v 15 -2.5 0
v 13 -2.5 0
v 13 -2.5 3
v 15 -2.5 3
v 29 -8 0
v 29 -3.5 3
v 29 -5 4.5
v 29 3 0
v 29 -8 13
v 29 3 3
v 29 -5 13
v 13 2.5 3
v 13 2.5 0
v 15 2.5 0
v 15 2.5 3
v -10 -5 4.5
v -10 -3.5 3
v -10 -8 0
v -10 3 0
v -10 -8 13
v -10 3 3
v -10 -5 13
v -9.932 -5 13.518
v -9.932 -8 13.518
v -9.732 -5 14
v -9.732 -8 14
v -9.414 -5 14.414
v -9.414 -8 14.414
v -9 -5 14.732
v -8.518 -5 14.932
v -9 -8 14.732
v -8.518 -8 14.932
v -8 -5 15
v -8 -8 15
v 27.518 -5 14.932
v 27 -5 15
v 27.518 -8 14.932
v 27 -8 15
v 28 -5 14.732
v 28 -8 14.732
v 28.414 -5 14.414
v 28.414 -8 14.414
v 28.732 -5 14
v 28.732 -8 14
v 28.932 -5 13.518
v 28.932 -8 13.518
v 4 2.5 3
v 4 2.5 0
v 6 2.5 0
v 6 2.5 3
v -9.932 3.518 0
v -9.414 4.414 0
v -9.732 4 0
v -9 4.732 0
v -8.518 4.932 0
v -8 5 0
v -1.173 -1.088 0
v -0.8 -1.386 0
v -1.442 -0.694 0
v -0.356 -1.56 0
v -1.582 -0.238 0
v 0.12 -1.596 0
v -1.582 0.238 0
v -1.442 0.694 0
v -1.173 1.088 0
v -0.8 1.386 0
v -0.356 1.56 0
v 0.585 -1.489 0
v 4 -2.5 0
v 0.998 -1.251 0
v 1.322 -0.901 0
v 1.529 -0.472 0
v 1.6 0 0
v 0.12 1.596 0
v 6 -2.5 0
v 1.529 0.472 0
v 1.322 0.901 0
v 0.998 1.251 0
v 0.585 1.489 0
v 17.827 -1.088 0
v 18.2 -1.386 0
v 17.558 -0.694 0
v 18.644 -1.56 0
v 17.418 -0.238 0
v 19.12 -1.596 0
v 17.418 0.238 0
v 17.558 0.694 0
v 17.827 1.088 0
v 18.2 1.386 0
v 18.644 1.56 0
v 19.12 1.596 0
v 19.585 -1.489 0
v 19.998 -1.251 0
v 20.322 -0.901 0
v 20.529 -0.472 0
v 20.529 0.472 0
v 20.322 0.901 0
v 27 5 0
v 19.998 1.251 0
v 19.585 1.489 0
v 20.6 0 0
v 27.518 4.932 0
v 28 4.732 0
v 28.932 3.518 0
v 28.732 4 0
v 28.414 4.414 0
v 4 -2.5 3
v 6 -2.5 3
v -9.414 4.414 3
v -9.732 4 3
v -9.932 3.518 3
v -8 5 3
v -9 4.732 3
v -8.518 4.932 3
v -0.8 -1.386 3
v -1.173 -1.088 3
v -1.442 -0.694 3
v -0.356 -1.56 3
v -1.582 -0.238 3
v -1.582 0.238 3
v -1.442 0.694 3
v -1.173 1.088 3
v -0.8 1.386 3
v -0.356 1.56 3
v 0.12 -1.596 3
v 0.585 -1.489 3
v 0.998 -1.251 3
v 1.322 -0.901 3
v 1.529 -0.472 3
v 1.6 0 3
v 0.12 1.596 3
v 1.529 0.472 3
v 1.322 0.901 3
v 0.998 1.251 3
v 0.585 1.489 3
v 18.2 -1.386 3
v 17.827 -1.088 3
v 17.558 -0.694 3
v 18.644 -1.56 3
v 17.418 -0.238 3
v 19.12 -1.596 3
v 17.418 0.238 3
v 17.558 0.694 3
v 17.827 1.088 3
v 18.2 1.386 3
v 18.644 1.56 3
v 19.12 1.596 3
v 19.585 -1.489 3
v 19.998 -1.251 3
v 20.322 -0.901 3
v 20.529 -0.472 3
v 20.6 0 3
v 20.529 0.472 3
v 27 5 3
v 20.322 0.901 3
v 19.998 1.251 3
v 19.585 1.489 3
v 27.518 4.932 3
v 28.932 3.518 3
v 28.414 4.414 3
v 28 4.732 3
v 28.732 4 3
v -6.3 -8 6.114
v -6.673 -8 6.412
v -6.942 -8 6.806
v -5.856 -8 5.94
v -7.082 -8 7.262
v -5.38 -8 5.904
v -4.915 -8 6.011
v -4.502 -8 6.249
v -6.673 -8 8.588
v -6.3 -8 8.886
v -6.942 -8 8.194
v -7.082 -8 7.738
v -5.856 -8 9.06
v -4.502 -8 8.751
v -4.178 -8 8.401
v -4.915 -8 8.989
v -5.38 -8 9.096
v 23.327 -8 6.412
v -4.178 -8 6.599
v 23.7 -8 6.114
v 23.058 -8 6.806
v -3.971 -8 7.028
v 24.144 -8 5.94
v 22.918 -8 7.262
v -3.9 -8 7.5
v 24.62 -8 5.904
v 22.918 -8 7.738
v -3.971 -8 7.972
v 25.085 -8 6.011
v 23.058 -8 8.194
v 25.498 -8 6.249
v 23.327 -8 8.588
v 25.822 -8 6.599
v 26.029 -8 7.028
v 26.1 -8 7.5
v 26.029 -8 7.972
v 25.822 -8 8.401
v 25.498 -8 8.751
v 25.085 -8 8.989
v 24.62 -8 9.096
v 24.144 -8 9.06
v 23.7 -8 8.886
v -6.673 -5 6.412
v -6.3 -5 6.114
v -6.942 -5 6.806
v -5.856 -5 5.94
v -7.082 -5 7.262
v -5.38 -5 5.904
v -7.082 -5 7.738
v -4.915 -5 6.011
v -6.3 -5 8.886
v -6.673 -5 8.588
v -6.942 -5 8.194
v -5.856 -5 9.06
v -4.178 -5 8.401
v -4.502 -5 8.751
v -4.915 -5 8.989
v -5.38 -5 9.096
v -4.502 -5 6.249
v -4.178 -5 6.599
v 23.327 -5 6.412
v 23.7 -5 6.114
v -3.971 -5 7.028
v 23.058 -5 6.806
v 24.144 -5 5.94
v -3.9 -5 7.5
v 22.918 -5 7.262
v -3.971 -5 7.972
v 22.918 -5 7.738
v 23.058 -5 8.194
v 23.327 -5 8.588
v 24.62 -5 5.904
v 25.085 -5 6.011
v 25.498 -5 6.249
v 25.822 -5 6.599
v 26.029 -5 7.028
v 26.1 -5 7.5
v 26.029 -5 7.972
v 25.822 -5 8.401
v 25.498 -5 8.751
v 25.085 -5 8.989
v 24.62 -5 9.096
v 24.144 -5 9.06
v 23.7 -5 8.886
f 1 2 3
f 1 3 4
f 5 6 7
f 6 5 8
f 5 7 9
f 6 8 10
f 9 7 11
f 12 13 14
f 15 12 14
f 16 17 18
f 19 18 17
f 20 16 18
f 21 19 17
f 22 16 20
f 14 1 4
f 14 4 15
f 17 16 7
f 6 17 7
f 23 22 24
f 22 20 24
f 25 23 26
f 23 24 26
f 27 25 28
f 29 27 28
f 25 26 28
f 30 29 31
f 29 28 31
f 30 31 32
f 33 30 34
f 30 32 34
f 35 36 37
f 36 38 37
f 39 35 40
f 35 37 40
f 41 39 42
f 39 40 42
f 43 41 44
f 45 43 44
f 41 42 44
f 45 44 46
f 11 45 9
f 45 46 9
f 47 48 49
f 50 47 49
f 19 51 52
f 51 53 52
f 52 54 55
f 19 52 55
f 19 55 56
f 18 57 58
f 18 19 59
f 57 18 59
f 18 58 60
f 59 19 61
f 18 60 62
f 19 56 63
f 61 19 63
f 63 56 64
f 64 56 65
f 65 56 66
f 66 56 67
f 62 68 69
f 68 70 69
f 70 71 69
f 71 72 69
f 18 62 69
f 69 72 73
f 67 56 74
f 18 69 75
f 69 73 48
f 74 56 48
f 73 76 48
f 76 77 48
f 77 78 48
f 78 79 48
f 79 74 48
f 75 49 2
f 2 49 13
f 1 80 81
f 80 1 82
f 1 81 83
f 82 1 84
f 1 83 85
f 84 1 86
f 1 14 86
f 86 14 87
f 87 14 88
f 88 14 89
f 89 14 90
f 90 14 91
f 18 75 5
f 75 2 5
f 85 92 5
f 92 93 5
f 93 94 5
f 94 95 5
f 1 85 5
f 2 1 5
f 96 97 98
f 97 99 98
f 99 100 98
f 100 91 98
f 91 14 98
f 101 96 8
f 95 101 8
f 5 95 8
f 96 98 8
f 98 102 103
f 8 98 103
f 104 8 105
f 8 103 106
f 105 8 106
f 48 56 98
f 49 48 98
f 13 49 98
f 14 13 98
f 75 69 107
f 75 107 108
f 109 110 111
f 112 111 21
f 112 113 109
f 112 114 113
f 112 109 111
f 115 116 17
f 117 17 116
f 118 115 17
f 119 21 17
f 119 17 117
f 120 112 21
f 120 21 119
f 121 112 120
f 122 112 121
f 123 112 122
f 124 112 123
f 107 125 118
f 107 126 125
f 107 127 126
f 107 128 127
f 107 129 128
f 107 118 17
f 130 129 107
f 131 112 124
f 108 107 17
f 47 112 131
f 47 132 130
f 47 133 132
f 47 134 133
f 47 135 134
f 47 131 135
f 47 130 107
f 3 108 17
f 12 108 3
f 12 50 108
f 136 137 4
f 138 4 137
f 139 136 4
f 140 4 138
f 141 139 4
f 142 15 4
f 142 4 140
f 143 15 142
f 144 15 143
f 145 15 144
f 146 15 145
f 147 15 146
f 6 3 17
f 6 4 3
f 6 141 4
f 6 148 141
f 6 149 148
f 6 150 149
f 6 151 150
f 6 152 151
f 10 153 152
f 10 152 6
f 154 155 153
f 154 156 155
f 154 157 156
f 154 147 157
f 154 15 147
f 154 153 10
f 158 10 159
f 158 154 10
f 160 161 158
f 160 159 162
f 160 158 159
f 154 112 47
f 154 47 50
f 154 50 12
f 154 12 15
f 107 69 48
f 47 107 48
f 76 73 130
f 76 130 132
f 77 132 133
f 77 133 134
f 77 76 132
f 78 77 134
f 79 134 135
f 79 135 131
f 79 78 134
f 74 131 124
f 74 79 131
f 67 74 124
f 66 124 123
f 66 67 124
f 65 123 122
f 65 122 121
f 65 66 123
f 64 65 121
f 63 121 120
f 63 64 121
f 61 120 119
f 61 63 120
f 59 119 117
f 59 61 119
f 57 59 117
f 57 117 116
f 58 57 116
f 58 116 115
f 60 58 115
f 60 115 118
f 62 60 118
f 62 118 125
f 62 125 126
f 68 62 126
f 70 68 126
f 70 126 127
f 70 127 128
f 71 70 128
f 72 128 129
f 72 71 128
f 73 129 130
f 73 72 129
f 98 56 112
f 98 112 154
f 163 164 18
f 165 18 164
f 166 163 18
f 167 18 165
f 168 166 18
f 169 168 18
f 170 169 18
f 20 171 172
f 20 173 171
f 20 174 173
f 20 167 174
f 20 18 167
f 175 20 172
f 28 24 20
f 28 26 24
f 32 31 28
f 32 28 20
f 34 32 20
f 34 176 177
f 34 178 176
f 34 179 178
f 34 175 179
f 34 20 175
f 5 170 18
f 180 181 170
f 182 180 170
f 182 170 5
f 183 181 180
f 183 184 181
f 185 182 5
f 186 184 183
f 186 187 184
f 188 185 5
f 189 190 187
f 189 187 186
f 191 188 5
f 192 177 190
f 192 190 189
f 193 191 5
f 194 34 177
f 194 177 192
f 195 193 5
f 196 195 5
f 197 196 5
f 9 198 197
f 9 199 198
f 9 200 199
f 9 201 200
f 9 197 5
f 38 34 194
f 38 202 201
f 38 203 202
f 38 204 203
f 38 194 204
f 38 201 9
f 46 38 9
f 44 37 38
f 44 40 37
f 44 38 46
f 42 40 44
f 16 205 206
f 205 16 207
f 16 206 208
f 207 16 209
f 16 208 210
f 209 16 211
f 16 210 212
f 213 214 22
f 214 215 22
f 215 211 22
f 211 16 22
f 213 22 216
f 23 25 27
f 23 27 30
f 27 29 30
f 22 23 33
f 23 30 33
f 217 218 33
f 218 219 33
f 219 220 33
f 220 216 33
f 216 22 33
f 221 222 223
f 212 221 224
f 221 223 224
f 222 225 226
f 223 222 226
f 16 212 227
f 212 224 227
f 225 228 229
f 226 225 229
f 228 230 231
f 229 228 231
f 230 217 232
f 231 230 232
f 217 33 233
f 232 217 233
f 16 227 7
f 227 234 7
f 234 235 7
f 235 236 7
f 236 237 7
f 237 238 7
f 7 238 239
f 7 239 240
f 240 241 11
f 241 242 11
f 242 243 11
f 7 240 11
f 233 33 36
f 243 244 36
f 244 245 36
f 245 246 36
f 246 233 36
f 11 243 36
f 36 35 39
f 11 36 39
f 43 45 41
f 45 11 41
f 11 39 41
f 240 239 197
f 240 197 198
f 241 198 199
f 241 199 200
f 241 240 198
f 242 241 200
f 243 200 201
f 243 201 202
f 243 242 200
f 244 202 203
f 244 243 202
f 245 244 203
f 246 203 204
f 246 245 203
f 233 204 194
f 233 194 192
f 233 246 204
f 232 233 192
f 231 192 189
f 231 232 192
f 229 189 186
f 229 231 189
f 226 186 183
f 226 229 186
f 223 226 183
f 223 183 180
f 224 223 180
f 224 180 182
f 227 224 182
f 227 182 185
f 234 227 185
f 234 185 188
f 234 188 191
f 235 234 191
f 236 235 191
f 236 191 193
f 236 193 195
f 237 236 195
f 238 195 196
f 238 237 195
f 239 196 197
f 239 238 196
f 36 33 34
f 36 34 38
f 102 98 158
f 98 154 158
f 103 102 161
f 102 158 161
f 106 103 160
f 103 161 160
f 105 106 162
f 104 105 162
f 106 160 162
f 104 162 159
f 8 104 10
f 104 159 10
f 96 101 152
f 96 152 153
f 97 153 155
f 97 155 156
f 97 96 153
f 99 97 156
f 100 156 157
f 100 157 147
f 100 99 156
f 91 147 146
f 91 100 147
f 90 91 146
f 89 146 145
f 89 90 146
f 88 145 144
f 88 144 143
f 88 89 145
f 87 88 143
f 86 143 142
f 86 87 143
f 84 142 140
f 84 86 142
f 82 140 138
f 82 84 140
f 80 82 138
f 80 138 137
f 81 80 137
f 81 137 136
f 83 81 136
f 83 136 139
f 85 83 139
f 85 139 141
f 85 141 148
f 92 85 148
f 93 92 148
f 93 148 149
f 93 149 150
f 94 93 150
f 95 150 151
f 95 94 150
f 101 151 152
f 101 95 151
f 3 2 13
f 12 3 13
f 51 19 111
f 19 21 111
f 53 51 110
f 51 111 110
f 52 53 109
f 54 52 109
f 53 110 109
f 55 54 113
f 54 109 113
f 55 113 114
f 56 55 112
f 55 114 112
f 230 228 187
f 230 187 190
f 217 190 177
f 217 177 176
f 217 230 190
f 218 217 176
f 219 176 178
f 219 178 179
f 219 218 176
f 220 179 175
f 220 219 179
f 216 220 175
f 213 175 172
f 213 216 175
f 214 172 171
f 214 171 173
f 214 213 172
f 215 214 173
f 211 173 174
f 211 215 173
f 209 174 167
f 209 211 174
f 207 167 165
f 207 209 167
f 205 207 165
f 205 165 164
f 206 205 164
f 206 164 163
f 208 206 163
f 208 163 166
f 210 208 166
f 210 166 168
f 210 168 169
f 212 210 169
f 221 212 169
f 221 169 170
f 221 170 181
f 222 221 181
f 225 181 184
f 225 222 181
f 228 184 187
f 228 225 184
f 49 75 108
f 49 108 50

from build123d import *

# Parameters (mm, degrees)
SKETCH_1_W      = 39
SKETCH_1_H      = 10
SKETCH_1_R      = 1.6
SKETCH_1_W_2    = 2
SKETCH_1_H_2    = 5
EXTRUDE_1_DEPTH = 3
SKETCH_2_W      = 39
SKETCH_2_H      = 15
SKETCH_2_R      = 1.6
EXTRUDE_2_DEPTH = 3
CHAMFER_1_SIZE  = 1.5
FILLET_1_R      = 2


with BuildPart() as part:
    # ｽｹｯﾁ1 → ﾎﾞｽ - 押し出し1 (new body)
    with BuildSketch(Plane.XY):
        with Locations((9.5, 0)):
            Rectangle(SKETCH_1_W, SKETCH_1_H)
        Circle(SKETCH_1_R, mode=Mode.SUBTRACT)
        with Locations((19, 0)):
            Circle(SKETCH_1_R, mode=Mode.SUBTRACT)
        with Locations((5, 0)):
            Rectangle(SKETCH_1_W_2, SKETCH_1_H_2, mode=Mode.SUBTRACT)
        with Locations((14, 0)):
            Rectangle(SKETCH_1_W_2, SKETCH_1_H_2, mode=Mode.SUBTRACT)
    extrude(amount=EXTRUDE_1_DEPTH)

    # ｽｹｯﾁ2 → ﾎﾞｽ - 押し出し2 (add)
    with BuildSketch(Plane.XZ.offset(5)):
        with Locations((9.5, 7.5)):
            Rectangle(SKETCH_2_W, SKETCH_2_H)
        with Locations((-5.5, 7.5)):
            Circle(SKETCH_2_R, mode=Mode.SUBTRACT)
        with Locations((24.5, 7.5)):
            Circle(SKETCH_2_R, mode=Mode.SUBTRACT)
    extrude(amount=EXTRUDE_2_DEPTH)

    # 面取り1
    chamfer_1_edges = [part.edges().sort_by_distance(p)[0] for p in [
        (9.5, -5, 3),
    ]]
    chamfer(chamfer_1_edges, length=CHAMFER_1_SIZE)

    # ﾌｨﾚｯﾄ1
    fillet_1_edges = [part.edges().sort_by_distance(p)[0] for p in [
        (29, -6.5, 15),
        (-10, -6.5, 15),
        (29, 5, 1.5),
        (-10, 5, 1.5),
    ]]
    fillet(fillet_1_edges, radius=FILLET_1_R)


solid = part.part
